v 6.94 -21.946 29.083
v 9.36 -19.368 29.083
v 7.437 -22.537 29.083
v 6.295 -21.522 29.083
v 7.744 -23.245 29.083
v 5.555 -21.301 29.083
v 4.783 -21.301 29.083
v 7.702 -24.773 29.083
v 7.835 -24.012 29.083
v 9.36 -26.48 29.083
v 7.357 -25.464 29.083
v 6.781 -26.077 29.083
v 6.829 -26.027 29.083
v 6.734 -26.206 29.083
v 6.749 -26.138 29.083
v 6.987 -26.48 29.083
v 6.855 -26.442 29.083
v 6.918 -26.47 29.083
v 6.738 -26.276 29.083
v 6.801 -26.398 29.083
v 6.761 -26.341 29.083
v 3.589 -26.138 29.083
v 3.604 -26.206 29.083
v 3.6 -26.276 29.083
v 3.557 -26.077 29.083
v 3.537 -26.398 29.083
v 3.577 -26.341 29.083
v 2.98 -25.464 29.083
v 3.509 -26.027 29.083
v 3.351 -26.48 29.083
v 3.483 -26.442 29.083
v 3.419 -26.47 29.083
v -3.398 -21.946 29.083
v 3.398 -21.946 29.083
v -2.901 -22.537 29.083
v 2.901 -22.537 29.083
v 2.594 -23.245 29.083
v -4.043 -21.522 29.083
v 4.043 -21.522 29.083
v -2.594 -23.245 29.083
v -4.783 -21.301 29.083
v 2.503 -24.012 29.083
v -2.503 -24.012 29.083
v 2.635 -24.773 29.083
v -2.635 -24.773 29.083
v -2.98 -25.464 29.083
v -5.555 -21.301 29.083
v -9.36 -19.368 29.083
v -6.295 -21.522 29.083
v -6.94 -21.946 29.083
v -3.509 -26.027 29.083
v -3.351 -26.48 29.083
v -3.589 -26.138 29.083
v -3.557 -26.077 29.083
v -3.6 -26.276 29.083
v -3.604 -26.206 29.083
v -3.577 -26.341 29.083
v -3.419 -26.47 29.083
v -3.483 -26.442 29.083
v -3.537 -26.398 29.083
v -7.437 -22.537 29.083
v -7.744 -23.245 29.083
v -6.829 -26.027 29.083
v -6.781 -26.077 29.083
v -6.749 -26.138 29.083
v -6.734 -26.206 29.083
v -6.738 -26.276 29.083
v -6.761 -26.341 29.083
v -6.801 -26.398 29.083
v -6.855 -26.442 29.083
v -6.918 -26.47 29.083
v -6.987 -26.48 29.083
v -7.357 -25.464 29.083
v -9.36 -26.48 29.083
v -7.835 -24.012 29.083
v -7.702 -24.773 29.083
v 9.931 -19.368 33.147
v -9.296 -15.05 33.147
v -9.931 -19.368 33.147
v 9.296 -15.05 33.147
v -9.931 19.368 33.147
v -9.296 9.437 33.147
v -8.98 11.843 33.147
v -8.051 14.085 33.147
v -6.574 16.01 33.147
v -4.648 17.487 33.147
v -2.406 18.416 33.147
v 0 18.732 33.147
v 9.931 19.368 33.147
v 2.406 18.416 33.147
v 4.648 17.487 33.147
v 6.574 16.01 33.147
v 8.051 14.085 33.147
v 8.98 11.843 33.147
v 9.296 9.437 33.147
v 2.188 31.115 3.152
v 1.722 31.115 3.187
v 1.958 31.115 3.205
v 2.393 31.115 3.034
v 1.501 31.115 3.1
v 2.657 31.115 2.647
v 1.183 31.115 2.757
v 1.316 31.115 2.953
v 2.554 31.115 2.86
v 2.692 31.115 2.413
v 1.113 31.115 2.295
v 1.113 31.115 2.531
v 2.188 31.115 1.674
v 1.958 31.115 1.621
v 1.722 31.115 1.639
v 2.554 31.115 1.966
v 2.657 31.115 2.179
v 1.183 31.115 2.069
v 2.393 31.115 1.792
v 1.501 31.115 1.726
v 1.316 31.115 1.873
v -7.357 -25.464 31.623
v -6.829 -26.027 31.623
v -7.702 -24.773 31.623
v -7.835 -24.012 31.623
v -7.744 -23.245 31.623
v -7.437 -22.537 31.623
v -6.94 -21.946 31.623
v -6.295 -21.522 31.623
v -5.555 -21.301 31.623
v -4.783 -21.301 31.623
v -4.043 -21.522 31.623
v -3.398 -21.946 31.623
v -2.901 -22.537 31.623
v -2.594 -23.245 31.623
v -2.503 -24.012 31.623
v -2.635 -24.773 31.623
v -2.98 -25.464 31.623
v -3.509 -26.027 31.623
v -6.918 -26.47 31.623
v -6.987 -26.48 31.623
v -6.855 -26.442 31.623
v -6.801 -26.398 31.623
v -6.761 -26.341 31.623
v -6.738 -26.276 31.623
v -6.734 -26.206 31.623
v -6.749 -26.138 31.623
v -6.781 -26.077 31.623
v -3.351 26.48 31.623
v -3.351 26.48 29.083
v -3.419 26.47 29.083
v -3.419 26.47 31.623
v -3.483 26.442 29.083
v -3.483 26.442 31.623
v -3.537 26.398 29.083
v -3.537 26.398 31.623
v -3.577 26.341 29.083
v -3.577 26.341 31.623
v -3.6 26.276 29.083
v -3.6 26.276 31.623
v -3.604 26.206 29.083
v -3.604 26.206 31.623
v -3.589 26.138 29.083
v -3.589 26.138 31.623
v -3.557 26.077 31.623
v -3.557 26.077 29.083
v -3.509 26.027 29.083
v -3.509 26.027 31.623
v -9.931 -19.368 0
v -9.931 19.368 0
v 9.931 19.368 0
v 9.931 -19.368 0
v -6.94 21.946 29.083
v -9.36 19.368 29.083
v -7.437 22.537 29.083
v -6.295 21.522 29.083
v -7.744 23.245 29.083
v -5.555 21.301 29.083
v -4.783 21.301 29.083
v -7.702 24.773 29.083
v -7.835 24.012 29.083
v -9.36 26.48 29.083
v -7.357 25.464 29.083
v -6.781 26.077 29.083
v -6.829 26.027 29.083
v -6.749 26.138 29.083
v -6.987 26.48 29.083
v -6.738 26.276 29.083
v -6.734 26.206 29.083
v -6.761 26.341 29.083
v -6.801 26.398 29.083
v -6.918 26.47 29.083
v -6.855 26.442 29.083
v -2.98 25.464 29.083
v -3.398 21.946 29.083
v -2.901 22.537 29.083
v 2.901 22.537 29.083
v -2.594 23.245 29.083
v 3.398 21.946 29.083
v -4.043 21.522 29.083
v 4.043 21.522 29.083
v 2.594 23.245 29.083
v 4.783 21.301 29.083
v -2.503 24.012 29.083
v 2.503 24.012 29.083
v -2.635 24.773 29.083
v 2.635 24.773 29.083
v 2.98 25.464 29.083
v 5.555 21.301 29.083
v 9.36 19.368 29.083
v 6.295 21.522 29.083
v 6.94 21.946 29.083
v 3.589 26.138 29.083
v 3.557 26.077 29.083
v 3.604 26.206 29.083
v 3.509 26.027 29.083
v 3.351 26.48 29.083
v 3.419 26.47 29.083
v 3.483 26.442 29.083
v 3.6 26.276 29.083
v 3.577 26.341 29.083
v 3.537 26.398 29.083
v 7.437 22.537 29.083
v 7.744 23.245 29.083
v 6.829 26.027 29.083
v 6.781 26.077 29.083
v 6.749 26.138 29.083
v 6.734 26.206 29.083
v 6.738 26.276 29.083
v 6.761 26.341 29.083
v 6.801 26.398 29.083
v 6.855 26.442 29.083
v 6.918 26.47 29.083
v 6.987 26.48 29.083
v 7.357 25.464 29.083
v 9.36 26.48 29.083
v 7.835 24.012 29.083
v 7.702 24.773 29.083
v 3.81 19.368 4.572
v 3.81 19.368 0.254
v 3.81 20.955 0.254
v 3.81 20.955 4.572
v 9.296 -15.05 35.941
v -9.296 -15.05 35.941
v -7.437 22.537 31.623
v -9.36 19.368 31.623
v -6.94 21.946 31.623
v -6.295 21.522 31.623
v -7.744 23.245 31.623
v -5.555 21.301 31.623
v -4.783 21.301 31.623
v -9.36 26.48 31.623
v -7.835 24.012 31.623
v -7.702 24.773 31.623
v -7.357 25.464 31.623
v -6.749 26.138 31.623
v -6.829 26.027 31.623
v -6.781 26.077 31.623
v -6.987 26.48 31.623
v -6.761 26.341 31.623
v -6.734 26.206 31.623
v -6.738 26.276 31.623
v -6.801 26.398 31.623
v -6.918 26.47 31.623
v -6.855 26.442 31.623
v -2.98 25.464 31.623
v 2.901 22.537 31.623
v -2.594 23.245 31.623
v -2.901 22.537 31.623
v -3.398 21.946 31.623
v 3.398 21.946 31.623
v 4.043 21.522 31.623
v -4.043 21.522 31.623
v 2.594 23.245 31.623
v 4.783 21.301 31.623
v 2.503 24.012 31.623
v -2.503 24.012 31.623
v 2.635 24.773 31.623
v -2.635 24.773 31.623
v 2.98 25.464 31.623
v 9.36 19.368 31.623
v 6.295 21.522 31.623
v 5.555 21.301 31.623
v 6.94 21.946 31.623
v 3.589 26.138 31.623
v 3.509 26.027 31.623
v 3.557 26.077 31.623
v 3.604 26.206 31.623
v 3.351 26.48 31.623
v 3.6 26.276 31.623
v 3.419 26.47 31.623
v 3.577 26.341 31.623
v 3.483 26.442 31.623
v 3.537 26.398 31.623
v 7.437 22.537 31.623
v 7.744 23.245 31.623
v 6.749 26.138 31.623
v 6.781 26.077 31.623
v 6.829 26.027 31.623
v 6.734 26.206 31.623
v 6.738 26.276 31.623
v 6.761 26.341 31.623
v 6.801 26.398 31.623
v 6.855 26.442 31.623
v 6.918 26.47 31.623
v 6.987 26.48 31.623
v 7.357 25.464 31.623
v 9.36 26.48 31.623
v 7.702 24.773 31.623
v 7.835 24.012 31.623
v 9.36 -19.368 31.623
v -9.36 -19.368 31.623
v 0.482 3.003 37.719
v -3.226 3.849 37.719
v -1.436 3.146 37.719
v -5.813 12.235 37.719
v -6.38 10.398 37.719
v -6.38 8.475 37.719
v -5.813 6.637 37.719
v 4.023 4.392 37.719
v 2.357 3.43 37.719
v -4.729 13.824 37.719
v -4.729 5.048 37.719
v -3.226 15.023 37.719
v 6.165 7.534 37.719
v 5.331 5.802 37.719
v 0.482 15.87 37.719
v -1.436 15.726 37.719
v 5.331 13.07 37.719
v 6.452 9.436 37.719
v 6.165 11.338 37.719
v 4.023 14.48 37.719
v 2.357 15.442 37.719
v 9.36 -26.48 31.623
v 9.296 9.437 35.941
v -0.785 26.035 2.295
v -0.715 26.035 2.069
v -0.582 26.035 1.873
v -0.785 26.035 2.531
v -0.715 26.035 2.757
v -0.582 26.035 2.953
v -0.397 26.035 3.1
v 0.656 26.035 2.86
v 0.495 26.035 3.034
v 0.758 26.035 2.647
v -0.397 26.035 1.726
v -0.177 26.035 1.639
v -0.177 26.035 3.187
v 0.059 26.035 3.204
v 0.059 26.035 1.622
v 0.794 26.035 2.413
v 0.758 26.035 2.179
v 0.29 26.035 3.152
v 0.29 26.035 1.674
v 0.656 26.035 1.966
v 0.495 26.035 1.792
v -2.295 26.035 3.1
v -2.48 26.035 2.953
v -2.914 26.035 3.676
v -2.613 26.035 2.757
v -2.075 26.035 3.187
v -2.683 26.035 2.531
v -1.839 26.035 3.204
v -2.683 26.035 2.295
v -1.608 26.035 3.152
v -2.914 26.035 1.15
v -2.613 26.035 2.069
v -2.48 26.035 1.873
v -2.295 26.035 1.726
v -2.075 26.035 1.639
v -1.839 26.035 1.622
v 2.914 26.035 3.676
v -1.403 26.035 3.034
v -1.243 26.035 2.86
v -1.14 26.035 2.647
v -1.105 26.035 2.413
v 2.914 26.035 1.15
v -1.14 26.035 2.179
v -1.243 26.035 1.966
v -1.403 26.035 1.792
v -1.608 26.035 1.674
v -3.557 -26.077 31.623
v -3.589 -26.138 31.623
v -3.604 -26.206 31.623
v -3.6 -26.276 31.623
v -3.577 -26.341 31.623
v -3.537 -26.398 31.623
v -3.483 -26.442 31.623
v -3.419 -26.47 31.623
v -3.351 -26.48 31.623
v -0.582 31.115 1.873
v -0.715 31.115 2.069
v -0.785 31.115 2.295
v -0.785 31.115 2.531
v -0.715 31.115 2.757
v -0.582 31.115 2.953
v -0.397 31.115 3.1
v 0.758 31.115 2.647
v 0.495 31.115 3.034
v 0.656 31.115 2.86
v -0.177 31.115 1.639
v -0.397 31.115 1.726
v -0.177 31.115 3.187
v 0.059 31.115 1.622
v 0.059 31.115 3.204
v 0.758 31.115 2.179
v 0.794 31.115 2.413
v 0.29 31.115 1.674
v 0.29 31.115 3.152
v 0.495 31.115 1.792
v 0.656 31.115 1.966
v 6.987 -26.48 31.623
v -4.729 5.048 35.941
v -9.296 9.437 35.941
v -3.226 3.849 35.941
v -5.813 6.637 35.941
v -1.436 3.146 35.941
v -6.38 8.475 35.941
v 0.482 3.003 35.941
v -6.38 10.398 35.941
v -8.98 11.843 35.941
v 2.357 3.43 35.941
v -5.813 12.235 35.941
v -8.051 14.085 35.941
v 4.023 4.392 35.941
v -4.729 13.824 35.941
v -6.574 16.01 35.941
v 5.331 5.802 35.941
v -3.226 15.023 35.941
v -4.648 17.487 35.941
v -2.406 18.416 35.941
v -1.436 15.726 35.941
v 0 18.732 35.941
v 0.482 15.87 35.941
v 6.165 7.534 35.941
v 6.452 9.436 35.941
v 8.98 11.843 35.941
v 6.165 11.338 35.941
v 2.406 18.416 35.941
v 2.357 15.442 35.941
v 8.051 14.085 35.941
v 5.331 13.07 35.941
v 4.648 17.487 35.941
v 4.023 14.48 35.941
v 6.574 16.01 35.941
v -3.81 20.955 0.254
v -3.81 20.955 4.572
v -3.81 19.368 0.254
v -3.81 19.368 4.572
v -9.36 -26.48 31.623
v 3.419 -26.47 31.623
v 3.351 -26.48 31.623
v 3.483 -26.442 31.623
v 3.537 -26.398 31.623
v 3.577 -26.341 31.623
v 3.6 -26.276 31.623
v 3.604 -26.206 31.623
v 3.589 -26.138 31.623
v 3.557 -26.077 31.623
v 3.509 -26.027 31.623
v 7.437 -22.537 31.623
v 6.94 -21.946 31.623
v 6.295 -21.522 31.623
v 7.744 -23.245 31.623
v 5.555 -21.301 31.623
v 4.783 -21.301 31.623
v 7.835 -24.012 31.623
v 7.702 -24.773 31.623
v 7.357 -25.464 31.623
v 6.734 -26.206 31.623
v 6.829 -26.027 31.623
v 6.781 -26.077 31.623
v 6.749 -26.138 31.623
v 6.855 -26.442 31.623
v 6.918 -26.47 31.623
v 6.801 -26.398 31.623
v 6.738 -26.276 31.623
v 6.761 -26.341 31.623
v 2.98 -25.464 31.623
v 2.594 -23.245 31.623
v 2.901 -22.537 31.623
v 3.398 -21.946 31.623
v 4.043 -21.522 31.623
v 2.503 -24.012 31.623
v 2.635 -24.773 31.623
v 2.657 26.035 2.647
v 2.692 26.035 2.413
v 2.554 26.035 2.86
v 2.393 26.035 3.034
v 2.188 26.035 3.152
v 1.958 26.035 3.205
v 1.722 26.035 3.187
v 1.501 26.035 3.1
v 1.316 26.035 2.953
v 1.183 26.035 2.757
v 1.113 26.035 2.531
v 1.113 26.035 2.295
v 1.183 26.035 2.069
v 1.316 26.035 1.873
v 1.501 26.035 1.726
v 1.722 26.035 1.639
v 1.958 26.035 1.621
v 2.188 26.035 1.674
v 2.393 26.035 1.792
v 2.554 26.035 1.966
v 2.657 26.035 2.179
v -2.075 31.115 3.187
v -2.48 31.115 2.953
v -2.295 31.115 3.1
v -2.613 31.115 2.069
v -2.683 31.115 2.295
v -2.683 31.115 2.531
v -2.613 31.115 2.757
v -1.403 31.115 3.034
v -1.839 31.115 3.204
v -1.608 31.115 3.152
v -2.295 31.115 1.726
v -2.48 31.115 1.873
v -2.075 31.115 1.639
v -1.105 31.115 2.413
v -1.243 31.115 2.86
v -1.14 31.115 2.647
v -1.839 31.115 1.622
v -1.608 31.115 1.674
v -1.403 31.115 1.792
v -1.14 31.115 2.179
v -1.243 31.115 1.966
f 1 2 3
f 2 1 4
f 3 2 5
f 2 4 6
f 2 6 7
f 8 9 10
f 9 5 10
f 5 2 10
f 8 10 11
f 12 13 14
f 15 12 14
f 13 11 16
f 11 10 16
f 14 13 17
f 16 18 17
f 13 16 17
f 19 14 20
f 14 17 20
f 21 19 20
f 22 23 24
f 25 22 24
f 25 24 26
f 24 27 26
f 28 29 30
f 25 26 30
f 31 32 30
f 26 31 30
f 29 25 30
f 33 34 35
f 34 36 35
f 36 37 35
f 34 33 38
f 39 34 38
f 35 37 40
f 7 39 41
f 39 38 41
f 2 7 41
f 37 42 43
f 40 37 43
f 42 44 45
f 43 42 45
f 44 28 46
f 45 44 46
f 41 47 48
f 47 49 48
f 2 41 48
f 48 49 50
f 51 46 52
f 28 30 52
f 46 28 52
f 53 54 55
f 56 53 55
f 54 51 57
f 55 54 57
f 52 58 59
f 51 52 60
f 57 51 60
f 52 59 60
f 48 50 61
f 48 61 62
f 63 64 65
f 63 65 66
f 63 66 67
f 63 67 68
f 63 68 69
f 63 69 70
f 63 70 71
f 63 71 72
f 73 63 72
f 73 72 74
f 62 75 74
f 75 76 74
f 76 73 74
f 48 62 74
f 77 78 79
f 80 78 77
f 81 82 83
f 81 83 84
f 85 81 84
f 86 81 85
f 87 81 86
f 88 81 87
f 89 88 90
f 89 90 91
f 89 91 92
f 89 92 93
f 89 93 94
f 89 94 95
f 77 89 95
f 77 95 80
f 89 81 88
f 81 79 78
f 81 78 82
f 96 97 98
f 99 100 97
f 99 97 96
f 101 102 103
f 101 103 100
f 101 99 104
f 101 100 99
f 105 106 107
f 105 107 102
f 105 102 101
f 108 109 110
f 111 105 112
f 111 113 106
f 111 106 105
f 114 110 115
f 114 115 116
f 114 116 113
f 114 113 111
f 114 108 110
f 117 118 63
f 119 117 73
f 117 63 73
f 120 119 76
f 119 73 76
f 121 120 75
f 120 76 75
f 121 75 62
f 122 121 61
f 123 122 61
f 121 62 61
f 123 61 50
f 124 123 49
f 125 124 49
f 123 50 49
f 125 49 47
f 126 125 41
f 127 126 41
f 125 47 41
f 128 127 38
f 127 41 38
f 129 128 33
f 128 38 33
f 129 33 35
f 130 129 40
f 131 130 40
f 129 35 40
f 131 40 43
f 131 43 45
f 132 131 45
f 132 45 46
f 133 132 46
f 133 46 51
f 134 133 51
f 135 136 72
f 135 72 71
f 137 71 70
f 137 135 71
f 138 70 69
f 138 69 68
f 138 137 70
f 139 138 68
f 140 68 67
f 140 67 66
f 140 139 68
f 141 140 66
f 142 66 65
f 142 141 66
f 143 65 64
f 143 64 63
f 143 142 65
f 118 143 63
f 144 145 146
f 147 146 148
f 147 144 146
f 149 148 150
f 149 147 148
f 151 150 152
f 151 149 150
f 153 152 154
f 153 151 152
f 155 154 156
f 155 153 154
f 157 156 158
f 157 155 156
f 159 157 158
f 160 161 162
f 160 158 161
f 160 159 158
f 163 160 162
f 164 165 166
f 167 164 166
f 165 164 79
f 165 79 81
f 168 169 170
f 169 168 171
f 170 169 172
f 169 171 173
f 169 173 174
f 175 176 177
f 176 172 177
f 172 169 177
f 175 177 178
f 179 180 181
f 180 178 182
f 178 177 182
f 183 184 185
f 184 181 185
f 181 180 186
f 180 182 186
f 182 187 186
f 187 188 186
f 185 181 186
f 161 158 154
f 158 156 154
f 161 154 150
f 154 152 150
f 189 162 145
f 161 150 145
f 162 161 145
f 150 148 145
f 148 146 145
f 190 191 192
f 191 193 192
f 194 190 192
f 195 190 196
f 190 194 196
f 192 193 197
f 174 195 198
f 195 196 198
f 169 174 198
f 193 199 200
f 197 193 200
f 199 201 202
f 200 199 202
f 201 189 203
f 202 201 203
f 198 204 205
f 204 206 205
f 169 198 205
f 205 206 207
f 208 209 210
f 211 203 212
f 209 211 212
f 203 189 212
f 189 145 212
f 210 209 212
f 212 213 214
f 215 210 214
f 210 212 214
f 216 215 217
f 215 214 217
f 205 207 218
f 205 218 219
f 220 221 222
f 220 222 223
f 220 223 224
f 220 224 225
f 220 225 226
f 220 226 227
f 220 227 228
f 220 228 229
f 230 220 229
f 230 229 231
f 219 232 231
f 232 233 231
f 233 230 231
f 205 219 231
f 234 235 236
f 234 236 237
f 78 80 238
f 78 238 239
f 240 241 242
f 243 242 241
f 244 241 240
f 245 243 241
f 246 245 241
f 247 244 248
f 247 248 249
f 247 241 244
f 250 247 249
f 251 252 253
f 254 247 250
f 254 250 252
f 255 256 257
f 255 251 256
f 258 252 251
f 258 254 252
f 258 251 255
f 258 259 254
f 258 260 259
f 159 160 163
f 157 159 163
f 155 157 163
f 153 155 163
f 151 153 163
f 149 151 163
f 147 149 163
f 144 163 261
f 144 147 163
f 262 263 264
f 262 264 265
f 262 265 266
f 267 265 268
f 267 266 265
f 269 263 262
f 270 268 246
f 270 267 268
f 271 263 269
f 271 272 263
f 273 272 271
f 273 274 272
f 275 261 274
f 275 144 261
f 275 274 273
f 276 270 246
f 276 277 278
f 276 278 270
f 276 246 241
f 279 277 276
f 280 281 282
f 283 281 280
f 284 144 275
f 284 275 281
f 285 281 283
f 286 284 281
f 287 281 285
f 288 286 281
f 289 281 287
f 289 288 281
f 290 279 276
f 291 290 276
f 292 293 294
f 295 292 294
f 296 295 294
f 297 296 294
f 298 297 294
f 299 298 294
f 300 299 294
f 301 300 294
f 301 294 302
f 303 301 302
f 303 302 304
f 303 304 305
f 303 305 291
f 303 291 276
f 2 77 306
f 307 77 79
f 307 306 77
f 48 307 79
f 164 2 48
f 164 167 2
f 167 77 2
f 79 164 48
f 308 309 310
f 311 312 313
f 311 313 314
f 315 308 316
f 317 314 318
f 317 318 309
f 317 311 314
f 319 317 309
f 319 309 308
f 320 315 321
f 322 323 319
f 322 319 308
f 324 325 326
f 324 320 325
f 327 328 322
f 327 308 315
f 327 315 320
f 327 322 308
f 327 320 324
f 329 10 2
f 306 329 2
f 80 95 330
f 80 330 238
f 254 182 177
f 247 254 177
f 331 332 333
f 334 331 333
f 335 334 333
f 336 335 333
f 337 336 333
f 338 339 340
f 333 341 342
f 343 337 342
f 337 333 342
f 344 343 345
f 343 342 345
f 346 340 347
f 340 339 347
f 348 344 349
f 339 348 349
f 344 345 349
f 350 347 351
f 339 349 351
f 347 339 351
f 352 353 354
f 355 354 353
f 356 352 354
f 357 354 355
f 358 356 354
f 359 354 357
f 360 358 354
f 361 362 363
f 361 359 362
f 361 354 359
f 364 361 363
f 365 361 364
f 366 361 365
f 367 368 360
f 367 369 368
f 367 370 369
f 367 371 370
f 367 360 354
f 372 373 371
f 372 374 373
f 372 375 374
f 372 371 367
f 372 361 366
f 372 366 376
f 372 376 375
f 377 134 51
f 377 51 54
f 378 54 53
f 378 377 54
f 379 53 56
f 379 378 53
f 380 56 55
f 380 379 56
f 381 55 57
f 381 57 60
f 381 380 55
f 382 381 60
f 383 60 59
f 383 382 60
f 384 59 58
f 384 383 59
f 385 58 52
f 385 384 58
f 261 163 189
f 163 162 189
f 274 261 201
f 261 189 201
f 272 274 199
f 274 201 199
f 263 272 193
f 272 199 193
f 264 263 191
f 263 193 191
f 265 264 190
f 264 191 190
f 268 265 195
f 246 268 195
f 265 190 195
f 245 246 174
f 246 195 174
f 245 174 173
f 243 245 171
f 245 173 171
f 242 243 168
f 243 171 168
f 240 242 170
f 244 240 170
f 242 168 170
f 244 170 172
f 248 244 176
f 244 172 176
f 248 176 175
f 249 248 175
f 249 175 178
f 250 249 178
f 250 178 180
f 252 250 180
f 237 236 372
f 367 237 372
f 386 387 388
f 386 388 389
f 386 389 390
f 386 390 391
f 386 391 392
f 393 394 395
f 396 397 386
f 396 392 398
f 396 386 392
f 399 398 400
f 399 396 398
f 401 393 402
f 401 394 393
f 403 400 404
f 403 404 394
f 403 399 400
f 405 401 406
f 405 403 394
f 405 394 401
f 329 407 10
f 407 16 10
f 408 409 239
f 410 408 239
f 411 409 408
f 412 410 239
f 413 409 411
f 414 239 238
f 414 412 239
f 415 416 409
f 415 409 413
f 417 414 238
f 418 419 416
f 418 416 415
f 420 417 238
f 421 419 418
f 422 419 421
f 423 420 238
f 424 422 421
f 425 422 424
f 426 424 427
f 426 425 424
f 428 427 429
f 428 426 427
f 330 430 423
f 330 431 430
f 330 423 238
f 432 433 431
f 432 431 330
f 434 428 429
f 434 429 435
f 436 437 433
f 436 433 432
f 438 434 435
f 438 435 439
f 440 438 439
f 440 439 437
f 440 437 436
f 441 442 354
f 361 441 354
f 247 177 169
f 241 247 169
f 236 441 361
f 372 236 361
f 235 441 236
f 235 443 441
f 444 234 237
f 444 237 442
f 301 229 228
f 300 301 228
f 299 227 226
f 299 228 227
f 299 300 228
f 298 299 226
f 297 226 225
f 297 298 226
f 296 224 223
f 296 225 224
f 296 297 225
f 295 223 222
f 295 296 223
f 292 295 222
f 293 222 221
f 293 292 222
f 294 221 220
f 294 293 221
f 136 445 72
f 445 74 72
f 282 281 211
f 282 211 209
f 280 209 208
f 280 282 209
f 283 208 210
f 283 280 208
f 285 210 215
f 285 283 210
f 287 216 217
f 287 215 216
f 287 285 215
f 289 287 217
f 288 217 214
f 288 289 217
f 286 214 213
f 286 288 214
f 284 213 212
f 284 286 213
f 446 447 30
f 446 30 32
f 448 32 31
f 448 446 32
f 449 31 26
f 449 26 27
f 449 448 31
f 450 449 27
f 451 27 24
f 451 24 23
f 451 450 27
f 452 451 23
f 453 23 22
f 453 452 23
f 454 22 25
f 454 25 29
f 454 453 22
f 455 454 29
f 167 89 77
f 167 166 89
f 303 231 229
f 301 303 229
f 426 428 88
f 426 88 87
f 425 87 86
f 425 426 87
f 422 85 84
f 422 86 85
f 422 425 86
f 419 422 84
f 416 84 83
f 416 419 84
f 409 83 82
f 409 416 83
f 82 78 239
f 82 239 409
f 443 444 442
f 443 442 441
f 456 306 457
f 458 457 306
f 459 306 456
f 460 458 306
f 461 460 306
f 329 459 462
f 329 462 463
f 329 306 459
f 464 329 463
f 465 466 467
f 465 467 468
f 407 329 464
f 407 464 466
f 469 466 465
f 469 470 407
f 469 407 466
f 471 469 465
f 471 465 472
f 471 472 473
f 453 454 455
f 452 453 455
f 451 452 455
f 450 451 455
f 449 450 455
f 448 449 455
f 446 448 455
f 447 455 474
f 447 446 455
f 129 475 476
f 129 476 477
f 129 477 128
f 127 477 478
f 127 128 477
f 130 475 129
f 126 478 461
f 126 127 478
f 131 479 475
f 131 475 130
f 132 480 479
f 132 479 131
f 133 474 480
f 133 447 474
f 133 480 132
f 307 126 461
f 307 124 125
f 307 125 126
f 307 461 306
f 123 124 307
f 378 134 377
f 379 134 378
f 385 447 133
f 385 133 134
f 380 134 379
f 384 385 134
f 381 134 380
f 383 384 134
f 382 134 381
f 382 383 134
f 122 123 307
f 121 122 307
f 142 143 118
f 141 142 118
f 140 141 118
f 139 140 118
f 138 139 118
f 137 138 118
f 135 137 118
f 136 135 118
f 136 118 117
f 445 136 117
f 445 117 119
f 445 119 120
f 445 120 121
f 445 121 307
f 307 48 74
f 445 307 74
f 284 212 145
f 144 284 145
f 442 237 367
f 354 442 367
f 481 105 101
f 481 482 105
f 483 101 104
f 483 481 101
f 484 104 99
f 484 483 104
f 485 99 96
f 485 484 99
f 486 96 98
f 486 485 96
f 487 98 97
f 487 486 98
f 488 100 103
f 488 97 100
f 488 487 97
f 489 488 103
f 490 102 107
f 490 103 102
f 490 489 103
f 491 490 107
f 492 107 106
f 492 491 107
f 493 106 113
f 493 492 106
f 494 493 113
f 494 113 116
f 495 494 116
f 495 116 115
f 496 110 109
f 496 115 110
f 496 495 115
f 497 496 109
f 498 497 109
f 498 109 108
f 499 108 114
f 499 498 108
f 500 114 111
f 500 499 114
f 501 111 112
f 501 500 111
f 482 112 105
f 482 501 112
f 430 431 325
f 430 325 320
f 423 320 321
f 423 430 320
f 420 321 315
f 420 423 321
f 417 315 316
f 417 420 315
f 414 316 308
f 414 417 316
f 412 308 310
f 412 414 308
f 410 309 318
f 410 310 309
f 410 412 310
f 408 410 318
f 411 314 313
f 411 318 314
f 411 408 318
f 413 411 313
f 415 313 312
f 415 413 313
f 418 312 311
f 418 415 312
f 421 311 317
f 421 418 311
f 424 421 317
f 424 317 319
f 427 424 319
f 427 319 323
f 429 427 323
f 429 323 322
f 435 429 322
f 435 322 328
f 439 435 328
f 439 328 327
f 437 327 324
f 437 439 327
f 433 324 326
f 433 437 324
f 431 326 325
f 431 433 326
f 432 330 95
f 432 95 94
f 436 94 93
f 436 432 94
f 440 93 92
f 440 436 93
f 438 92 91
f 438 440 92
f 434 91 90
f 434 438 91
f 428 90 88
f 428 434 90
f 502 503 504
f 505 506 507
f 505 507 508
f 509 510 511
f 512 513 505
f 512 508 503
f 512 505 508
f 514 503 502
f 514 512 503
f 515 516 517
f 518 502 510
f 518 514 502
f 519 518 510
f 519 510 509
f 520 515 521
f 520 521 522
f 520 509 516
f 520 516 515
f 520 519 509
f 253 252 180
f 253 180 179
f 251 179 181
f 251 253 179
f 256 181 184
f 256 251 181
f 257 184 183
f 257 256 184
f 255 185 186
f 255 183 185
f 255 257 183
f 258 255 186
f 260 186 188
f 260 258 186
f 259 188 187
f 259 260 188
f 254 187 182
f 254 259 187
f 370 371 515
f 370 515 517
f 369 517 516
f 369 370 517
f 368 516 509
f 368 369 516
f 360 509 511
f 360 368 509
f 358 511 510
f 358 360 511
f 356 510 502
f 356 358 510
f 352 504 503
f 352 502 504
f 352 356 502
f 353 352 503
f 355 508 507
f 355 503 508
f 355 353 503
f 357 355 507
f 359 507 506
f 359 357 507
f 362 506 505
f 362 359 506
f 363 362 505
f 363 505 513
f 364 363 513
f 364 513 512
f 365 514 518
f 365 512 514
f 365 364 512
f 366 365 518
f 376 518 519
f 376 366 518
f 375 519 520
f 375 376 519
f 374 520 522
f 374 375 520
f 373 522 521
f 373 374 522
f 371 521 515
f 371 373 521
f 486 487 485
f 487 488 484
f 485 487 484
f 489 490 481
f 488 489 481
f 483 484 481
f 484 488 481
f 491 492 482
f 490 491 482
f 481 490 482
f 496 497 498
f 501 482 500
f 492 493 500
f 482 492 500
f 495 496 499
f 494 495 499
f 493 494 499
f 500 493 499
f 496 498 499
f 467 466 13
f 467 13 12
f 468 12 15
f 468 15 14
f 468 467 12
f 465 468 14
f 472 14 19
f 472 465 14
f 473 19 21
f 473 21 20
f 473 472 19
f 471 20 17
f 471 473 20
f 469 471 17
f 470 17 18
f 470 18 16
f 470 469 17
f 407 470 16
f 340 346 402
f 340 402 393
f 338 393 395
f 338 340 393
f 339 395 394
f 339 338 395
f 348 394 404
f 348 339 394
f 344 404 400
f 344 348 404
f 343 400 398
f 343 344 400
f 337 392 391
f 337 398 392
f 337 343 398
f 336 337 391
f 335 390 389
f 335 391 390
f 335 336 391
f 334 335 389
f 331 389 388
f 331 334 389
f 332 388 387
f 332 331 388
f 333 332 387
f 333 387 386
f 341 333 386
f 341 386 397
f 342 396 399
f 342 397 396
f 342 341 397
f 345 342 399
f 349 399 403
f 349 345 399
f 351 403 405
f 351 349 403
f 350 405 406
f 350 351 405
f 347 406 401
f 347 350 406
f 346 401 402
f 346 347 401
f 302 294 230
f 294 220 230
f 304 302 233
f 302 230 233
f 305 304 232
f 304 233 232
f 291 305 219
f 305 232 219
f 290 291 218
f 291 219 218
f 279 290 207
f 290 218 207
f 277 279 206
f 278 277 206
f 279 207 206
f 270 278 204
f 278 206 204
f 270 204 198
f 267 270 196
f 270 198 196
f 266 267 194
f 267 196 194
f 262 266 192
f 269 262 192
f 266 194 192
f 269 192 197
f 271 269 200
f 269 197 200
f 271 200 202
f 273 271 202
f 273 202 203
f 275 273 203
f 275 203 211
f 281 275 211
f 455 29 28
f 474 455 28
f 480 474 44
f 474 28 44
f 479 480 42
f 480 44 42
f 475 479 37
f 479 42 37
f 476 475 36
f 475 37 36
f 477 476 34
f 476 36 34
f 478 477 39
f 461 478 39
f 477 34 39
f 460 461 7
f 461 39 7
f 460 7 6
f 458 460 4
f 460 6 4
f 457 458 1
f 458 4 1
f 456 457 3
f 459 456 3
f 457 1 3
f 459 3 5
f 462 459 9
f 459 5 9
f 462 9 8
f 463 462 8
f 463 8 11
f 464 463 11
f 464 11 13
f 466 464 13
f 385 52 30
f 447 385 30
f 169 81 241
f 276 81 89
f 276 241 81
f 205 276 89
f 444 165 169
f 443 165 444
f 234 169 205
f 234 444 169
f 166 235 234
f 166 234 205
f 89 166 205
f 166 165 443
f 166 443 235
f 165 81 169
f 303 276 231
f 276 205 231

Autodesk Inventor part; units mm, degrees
ref_plane "YZ Plane" through (0, 0, 0) normal (1, 0, 0) x (0, 1, 0)
ref_plane "XZ Plane" through (0, 0, 0) normal (0, 1, 0) x (-1, 0, 0)
sketch "Hole Pattern 4" plane through (0, 0, 0) normal (0, 0, 1) x (1, 0, 0)
  circle A0 centre (-145.7144, 104.3642) radius 4
  circle A1 centre (-145.7144, 104.3642) radius 8 construction
  circle A2 centre (-145.7144, 112.3642) radius 1.85
  circle A3 centre (-145.7144, 96.3642) radius 1.85
  circle A4 centre (-153.7144, 104.3642) radius 1.85
  circle A5 centre (-137.7144, 104.3642) radius 1.85
  circle A6 centre (-145.7144, 120.3642) radius 4
  circle A7 centre (-145.7144, 88.3642) radius 4
  point P0 (-145.7144, 107.7928)
  dimension "d140" = 16
  dimension "d141" = 3.7
  dimension "d142" = 16
  dimension "d143" = 16
  dimension "d144" = 8
sketch "Sketch1" plane through (0, 0, 0) normal (0, 0, 1) x (1, 0, 0)
  line L0 (-9.9314, 19.3675) -> (9.9314, 19.3675)
  line L1 (9.9314, 19.3675) -> (9.9314, -19.3675)
  line L2 (9.9314, -19.3675) -> (-9.9314, -19.3675)
  line L3 (-9.9314, -19.3675) -> (-9.9314, 19.3675)
  point P0 (0, 0)
  point P1 (-9.9314, 0)
  point P2 (0, 19.3675)
  dimension "d0" = 19.8628
  dimension "d1" = 38.735
extrude "Extrusion1" add sketch "Sketch1" along normal blind 33.147
sketch "Sketch2" plane through (0, 0, 33.147) normal (0, 0, 1) x (1, 0, 0)
  line L0 (9.9314, 19.3675) -> (-9.9314, 19.3675) projected
  line L1 (-9.9314, 19.3675) -> (-9.9314, -19.3675) projected
  line L2 (-9.9314, -19.3675) -> (9.9314, -19.3675) projected
  line L3 (-9.2964, 18.7325) -> (9.2964, 18.7325)
  line L4 (9.2964, 18.7325) -> (9.2964, -15.0495)
  line L5 (9.2964, -15.0495) -> (-9.2964, -15.0495)
  line L6 (-9.2964, -15.0495) -> (-9.2964, 18.7325)
  arc A0 (-3.6998, -15.0495) -> (3.6998, -15.0495) centre (0, -10.9617) ccw
  point P0 (0, 0)
  point P1 (0, 18.7325)
  dimension "d4" = 0.635
  dimension "d5" = 0.635
  dimension "d6" = 4.318
extrude "Extrusion2" add sketch "Sketch2" along normal blind 2.794 contours L3 L4 L5 L6
sketch "Sketch3" plane through (0, 0, 35.941) normal (0, 0, 1) x (1, 0, 0)
  circle A0 centre (0, 9.4361) radius 6.4516
  line L0 (9.9314, 19.3675) -> (-9.9314, 19.3675) projected
  point P0 (0, 0)
  dimension "d9" = 12.9032
  dimension "d11" = 9.9314
extrude "Extrusion3" add sketch "Sketch3" along normal blind 1.778
fillet "Fillet1" radius 9.2964 2 edges at (9.2964, 18.7325, 34.544) (-9.2964, 18.7325, 34.544)
ref_plane "Work Plane1" through (0, 0, 29.083) normal (0, 0, 1) x (1, 0, 0)
sketch "Sketch4" plane through (0, 0, 29.083) normal (0, 0, 1) x (1, 0, 0)
  line L0 (9.9314, 19.3675) -> (9.9314, -19.3675) projected
  line L1 (9.9314, -19.3675) -> (-9.9314, -19.3675) projected
  line L2 (-9.9314, -19.3675) -> (-9.9314, 19.3675) projected
  line L3 (-9.9314, 19.3675) -> (9.9314, 19.3675) projected
  line L4 (-9.3599, 19.3675) -> (9.3599, 19.3675)
  line L5 (9.3599, 19.3675) -> (9.3599, 26.4795)
  line L6 (-9.3599, 26.4795) -> (-9.3599, 19.3675)
  circle A0 centre (-5.1689, 23.9395) radius 2.667
  circle A1 centre (5.1689, 23.9395) radius 2.667
  line L7 (-5.9821, 26.4795) -> (-9.3599, 26.4795)
  line L8 (9.3599, 26.4795) -> (5.9821, 26.4795)
  line L9 (4.3557, 26.4795) -> (-4.3557, 26.4795)
  point P0 (0, 0)
  point P1 (0, 26.4795)
  dimension "d16" = 18.7198
  dimension "d18" = 7.112
  dimension "d20" = 5.334
  dimension "d21" = 4.191
  dimension "d22" = 4.191
extrude "Extrusion4" add sketch "Sketch4" along normal blind 2.54 contours L3 L6 L7 A0 L9 A1 L8 L5
fillet "Fillet2" radius 0.254 4 edges at (-5.9821, 26.4795, 30.353) (-4.3557, 26.4795, 30.353) (4.3557, 26.4795, 30.353) (5.9821, 26.4795, 30.353)
mirror "Mirror1" about plane through (0, 0, 0) normal (0, 1, 0) of "Extrusion4", "Fillet2"
sketch "Sketch5" plane through (-9.9314, 19.3675, 0) normal (0, 1, 0) x (1, 0, 0)
  line L0 (0, 0) -> (19.8628, 0) projected
  line L1 (6.1214, -0.254) -> (13.7414, -0.254)
  line L2 (13.7414, -0.254) -> (13.7414, -4.572)
  line L3 (13.7414, -4.572) -> (6.1214, -4.572)
  line L4 (6.1214, -4.572) -> (6.1214, -0.254)
  point P0 (9.9314, 0)
  point P1 (9.9314, -0.254)
  point P2 (9.9314, 0)
  dimension "d26" = 7.62
  dimension "d27" = 4.318
  dimension "d28" = 0.254
extrude "Extrusion5" add sketch "Sketch5" along normal blind 1.5875
sketch "Sketch6" plane through (-9.9314, 20.955, 0) normal (0, 1, 0) x (1, 0, 0)
  line L0 (13.7414, -0.254) -> (6.1214, -0.254) projected
  line L1 (6.1214, -0.254) -> (6.1214, -4.572) projected
  line L2 (6.1214, -4.572) -> (13.7414, -4.572) projected
  line L3 (13.7414, -4.572) -> (13.7414, -0.254) projected
  point P0 (9.9314, 0)
extrude "Extrusion6" add sketch "Sketch6" along normal blind 5.08 draft -10
sketch "Sketch7" plane through (-9.9314, 26.035, 0) normal (0, 1, 0) x (1, 0, 0)
  circle A0 centre (9.9314, -2.413) radius 0.7937
  point P0 (9.9314, 0)
  dimension "d33" = 1.5875
extrude "Extrusion7" add sketch "Sketch7" along normal blind 5.08 separate body
sketch "Sketch8" plane through (-9.9314, 26.035, 0) normal (0, 1, 0) x (1, 0, 0)
  line L0 (7.0171, -3.6763) -> (7.0171, -1.1497) projected
  circle A0 centre (8.0331, -2.413) radius 0.7937
  point P0 (9.9314, 0)
  dimension "d36" = 1.5875
  dimension "d37" = 1.016
extrude "Extrusion8" add sketch "Sketch8" along normal blind 5.08 bodies 1
sketch "Sketch9" plane through (-9.9314, 26.035, 0) normal (0, 1, 0) x (1, 0, 0)
  line L0 (12.8457, -1.1497) -> (12.8457, -3.6763) projected
  circle A0 centre (11.8297, -2.413) radius 0.7938
  point P0 (9.9314, 0)
  dimension "d40" = 1.5875
  dimension "d41" = 1.016
extrude "Extrusion9" add sketch "Sketch9" along normal blind 5.08 separate body
sketch "Sketch25" plane through (0, 9.4361, 37.719) normal (0, 0, 1) x (1, 0, 0)
  circle A0 centre (0, 0) radius 6.4516 projected
  circle A1 centre (0, 0) radius 4.5085
  point P0 (0, -9.4361)
  dimension "d145" = 9.017
equation "\"d5\" = d4"
equation "\"d22\" = d21"
properties part number "Tetrix 180 Servo"
